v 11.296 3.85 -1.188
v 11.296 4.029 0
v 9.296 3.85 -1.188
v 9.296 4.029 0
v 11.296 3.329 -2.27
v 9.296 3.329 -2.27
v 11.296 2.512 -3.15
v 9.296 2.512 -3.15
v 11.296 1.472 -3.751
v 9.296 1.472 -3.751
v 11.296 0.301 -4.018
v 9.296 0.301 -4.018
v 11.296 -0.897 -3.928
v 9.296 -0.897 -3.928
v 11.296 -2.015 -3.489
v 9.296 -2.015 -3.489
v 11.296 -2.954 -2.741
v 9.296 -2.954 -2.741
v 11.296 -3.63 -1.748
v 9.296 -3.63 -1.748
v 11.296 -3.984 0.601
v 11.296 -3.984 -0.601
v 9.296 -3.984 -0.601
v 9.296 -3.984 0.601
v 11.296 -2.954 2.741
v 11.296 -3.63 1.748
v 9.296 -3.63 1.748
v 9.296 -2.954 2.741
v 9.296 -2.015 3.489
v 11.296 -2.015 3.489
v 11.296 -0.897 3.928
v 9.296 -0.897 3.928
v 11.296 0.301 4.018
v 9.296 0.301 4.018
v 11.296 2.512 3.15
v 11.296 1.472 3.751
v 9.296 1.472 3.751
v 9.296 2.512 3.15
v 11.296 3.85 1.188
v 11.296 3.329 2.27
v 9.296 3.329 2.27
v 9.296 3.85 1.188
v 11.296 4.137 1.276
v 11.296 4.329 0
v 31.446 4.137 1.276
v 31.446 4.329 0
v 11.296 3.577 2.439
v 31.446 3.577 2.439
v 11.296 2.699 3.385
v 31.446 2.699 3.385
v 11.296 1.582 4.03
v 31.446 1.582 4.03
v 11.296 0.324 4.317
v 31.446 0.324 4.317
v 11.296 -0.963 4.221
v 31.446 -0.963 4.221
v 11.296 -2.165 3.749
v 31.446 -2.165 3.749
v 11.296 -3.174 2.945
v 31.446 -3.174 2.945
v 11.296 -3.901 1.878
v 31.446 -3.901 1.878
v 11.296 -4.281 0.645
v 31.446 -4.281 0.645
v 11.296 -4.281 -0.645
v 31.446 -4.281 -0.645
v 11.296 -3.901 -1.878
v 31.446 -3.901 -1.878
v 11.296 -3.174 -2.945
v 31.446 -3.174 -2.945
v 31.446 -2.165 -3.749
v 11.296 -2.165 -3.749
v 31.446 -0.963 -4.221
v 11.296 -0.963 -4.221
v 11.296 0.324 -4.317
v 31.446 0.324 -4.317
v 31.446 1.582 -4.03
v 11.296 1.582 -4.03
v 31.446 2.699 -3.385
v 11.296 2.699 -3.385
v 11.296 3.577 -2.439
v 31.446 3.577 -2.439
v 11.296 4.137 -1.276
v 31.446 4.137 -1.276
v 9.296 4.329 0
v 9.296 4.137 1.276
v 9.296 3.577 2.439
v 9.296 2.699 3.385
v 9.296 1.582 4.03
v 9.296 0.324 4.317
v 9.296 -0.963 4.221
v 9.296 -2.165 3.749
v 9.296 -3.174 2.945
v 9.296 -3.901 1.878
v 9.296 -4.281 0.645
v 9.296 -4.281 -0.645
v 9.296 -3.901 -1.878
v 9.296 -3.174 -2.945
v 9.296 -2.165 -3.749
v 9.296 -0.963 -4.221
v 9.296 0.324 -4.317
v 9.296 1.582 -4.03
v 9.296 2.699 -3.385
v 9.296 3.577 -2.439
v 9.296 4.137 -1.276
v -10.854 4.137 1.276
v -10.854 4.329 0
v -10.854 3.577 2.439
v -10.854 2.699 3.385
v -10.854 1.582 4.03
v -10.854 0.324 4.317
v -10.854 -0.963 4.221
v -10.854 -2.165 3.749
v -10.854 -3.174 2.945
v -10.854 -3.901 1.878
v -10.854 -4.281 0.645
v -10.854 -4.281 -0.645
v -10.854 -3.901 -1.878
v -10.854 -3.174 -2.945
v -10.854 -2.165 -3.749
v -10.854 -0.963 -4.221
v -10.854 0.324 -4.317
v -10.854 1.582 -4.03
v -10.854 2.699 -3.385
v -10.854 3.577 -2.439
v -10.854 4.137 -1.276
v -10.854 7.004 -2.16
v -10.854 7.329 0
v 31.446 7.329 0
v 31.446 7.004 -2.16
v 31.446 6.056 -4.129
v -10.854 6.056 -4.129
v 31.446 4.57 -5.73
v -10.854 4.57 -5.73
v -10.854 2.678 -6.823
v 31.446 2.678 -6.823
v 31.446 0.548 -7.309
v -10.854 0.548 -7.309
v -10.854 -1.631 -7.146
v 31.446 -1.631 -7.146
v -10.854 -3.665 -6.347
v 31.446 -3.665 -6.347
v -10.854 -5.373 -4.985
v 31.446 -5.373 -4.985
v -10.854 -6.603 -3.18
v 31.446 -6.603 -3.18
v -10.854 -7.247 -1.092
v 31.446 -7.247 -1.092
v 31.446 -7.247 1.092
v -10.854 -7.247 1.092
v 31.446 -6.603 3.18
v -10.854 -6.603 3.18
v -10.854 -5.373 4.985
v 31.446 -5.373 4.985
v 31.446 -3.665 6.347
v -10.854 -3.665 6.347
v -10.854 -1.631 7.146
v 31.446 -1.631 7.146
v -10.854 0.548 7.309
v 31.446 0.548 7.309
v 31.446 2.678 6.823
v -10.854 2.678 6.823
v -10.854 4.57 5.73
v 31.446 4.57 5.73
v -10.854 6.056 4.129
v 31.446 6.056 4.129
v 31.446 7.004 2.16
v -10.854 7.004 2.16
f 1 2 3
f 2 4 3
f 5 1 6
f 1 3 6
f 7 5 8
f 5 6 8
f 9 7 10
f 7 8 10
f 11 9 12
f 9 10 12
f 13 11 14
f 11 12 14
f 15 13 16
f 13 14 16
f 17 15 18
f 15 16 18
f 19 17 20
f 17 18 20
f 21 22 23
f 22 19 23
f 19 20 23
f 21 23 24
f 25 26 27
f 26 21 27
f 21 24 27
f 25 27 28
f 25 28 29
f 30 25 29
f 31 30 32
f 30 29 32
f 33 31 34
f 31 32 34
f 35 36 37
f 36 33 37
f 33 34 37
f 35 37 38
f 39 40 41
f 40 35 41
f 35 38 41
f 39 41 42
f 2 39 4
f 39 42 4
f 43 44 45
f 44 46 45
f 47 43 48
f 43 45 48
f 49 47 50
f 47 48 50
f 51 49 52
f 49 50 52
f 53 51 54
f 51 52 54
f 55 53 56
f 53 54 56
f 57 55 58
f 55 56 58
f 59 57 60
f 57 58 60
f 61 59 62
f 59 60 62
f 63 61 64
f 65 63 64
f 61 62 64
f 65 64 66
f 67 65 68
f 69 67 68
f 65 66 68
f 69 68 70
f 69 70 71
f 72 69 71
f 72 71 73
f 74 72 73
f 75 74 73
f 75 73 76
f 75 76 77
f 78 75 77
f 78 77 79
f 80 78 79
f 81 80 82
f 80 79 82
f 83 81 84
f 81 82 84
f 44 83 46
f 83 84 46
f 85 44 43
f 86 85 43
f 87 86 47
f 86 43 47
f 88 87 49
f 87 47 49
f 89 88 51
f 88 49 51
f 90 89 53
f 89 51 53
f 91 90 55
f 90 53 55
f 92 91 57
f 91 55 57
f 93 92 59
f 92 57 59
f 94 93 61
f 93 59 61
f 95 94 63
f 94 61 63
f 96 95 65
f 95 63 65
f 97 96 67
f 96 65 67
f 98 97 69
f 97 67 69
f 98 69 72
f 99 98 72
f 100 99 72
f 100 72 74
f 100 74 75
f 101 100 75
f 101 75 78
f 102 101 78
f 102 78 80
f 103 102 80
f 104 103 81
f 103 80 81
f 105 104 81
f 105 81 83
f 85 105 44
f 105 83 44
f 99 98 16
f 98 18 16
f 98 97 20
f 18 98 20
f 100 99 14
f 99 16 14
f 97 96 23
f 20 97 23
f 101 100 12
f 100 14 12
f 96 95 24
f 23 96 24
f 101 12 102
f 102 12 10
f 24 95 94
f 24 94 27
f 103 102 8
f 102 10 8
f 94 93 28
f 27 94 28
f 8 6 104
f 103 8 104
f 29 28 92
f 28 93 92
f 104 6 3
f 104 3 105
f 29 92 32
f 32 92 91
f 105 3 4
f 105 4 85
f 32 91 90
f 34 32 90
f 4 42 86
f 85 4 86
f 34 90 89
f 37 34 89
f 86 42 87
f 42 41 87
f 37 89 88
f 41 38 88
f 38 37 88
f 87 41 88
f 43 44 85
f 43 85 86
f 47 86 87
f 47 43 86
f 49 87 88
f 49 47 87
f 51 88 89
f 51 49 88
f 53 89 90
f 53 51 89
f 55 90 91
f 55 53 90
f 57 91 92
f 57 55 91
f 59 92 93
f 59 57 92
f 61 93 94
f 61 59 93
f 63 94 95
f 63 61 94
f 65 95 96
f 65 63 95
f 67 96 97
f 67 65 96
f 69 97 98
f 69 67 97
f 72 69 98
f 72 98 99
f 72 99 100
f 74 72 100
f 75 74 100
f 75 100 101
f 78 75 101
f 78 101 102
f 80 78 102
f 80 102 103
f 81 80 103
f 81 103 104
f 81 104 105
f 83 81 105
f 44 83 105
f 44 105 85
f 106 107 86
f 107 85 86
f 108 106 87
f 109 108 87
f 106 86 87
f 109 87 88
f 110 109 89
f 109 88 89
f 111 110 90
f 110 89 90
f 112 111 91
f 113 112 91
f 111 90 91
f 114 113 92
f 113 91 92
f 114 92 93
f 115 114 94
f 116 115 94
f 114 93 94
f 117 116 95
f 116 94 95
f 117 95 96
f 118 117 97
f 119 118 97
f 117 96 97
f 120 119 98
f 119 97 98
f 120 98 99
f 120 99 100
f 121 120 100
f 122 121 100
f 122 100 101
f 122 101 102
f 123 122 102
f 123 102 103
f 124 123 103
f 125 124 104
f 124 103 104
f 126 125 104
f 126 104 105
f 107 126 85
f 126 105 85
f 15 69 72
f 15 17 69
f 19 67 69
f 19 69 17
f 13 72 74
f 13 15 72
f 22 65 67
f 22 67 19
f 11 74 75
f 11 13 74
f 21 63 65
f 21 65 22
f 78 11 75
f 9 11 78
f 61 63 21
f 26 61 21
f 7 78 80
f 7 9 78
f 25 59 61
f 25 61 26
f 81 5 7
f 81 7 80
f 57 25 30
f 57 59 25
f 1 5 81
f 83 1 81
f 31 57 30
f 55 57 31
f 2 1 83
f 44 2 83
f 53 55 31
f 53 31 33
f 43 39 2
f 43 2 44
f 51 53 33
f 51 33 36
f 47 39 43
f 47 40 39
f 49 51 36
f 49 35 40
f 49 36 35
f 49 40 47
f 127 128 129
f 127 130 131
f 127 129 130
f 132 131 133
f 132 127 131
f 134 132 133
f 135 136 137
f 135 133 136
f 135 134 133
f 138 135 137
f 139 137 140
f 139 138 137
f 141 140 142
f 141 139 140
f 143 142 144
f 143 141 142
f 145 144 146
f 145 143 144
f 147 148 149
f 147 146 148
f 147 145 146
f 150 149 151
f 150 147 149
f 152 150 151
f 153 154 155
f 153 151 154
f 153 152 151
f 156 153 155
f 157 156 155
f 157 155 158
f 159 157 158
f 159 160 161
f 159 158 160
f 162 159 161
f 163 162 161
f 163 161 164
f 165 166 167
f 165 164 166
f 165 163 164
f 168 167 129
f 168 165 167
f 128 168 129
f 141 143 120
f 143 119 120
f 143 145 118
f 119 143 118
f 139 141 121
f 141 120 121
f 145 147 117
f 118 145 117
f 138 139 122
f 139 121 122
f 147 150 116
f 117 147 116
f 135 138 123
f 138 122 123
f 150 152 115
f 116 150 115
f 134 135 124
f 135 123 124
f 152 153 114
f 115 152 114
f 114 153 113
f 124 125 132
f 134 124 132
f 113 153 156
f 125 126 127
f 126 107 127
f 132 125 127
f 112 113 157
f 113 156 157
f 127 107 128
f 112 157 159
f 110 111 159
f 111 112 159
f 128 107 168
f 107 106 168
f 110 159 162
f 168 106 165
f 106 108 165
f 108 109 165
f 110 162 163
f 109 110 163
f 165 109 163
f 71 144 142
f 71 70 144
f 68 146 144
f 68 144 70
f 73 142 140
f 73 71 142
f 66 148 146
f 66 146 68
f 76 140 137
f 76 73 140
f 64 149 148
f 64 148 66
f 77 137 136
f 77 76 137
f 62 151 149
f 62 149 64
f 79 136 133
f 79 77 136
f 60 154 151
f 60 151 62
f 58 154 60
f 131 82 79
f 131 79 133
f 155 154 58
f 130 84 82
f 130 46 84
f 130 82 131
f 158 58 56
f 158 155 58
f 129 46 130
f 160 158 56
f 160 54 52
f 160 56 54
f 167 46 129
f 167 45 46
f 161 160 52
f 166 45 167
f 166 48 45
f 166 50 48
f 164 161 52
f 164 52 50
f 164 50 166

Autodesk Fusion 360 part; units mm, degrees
sketch "Sketch1" plane through (0, 0, 0) normal (0, 0, 1) x (1, 0, 0)
  line L0 (-10.8538, 4.3293) -> (31.4462, 4.3293)
  line L1 (31.4462, 4.3293) -> (31.4462, 7.3293)
  line L2 (31.4462, 7.3293) -> (-10.8538, 7.3293)
  line L3 (-10.8538, 7.3293) -> (-10.8538, 4.3293)
  line L4 (10.2962, 7.3293) -> (10.2962, 4.3293) construction
  line L5 (31.4462, 5.8293) -> (-10.8538, 5.8293) construction
  line L6 (9.2962, 4.3293) -> (11.2962, 4.3293)
  line L7 (11.2962, 4.3293) -> (11.2962, 4.0293)
  line L8 (11.2962, 4.0293) -> (9.2962, 4.0293)
  line L9 (9.2962, 4.0293) -> (9.2962, 4.3293)
  line L10 (10.2962, 4.3293) -> (10.2962, 4.0293) construction
  dimension "d1" = 3
  dimension "d2" = 42.3
  dimension "d3" = 0.3
  dimension "d4" = 2
revolve "Revolve2" add sketch "Sketch1" angle 360 about axis through (1.75, 0, 0) along (1, 0, 0) contours L0 L1 L2 L3 L6 makes body 1
revolve "Revolve1" add sketch "Sketch1" angle 360 about axis through (1.75, 0, 0) along (1, 0, 0) separate body contours L0 L6 L7 L8 L9 makes body 2
sketch "Sketch2" plane through (31.4462, 0, 0) normal (1, 0, 0) x (0, 0, -1)
  circle A0 centre (0, 0) radius 7.3293
  circle A1 centre (0, 0) radius 4.3293
